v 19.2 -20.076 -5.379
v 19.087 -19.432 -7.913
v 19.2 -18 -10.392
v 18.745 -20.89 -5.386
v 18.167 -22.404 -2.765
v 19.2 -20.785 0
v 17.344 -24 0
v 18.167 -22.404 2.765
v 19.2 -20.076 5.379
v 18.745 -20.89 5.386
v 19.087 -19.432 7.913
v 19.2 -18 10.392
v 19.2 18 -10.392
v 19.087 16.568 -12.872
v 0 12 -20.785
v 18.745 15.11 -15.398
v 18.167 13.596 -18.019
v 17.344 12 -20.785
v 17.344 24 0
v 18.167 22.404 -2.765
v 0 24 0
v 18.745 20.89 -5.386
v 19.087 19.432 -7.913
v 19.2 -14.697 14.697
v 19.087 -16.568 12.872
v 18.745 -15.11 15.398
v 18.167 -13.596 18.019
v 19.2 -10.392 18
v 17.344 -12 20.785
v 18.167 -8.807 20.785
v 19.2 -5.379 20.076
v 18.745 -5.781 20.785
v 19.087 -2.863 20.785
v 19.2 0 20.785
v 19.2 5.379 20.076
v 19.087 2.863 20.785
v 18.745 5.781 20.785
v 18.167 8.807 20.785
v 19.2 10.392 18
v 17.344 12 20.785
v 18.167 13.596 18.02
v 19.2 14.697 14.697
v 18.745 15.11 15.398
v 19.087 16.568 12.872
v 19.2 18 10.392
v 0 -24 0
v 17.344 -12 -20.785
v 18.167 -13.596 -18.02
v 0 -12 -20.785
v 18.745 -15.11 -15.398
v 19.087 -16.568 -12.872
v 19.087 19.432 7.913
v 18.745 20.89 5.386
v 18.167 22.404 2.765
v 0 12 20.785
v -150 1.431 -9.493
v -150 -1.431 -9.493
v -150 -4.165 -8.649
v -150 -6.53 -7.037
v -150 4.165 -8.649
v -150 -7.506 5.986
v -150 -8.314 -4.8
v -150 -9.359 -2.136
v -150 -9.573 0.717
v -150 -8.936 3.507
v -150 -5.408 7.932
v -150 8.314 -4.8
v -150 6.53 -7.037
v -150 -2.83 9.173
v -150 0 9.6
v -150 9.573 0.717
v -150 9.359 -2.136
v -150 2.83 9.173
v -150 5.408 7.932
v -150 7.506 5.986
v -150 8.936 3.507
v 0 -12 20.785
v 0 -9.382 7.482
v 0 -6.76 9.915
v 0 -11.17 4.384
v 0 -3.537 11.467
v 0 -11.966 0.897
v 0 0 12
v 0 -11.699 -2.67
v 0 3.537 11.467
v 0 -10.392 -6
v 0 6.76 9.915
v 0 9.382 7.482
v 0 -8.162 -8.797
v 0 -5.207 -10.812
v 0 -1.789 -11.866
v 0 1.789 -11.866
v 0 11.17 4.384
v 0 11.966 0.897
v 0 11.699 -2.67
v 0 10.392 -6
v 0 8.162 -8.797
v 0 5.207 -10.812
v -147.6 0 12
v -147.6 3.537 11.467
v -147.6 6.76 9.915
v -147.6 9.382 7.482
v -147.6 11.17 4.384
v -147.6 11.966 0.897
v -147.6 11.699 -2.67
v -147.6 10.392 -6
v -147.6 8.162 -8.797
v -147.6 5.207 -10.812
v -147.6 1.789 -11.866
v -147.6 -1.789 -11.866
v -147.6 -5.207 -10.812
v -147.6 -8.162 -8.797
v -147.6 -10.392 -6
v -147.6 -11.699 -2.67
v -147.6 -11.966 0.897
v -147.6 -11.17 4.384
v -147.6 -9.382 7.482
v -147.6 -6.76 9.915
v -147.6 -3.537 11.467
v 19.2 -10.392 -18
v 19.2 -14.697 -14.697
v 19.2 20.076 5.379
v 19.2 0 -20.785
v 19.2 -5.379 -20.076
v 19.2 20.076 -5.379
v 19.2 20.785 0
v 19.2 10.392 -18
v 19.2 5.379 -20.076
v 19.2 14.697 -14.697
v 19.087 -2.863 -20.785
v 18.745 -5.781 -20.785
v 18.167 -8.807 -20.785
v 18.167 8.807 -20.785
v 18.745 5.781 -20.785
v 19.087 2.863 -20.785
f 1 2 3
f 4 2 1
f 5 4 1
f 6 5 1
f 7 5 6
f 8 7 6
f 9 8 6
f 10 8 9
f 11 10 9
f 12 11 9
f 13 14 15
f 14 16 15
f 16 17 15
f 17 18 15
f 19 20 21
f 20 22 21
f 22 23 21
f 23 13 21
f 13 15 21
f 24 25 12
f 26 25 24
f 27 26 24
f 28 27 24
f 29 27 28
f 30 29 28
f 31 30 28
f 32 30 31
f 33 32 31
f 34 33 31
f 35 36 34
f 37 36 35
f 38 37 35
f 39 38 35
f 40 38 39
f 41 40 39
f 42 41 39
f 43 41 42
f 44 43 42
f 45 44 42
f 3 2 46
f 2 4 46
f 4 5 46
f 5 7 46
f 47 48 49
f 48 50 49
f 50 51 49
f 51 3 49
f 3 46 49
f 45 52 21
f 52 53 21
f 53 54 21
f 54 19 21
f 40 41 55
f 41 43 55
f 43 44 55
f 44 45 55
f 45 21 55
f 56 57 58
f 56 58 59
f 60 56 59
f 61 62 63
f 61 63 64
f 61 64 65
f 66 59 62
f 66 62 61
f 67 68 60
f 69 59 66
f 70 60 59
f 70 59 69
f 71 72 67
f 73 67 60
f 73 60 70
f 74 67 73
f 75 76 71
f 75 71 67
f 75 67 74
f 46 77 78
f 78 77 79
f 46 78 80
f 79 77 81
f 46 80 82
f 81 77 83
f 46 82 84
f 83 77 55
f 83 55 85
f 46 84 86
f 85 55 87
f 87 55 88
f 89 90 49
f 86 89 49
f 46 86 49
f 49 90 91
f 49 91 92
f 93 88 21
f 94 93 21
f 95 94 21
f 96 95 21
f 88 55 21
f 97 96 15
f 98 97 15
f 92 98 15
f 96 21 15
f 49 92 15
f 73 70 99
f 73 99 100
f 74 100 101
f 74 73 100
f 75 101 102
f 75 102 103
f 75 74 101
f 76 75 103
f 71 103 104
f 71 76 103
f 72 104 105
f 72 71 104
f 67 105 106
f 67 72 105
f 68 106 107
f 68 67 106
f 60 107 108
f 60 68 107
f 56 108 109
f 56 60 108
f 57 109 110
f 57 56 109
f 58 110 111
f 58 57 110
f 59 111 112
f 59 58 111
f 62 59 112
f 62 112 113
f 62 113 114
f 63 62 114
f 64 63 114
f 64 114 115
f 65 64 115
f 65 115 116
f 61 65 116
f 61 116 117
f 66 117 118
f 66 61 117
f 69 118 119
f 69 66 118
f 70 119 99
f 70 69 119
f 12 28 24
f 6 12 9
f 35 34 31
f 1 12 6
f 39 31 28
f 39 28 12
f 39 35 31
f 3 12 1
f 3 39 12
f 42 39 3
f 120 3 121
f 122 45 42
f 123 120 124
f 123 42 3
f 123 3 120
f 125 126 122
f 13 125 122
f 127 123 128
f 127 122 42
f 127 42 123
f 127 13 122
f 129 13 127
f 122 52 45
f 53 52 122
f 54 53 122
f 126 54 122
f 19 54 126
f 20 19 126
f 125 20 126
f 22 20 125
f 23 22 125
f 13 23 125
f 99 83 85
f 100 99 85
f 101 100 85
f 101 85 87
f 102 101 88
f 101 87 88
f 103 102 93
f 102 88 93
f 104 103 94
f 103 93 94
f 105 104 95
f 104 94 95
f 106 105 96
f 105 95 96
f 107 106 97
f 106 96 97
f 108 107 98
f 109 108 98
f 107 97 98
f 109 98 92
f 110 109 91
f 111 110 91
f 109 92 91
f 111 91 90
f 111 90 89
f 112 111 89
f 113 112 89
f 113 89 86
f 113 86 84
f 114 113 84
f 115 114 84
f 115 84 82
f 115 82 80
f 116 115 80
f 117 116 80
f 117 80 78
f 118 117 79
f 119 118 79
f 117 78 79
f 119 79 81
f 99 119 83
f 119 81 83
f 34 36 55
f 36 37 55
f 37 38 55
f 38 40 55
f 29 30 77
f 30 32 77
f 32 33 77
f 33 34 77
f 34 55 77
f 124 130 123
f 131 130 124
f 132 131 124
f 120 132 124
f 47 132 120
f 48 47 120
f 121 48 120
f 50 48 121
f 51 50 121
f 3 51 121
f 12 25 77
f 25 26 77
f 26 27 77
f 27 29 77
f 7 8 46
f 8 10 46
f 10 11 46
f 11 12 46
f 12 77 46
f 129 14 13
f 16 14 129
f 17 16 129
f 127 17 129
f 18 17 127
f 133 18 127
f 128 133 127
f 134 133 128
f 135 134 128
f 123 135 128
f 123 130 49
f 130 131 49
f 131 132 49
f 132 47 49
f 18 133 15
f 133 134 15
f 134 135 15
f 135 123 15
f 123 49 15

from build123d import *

# Parameters (mm, degrees)
BOSS_EXTRUDE2_DEPTH = 19.2
SKETCH3_R           = 12
BOSS_EXTRUDE3_DEPTH = 150
CHAMFER1_SIZE       = 2.4
SKETCH5_OUTSIDE_W   = 599.33
SKETCH5_OUTSIDE_H   = 605.76
SKETCH5_OUTSIDE_R   = 20.784609691
CUT_EXTRUDE1_DEPTH  = 150
CUT_EXTRUDE1_TAPER  = 60


with BuildPart() as part:
    # Sketch1 → Boss-Extrude2 (new body)
    with BuildSketch(Plane(origin=(0, 0, 0), x_dir=(0, 0, -1), z_dir=(1, 0, 0))):
        Polygon((0, 24), (-20.784609691, 12), (-20.784609691, -12), (0, -24), (20.784609691, -12), (20.784609691, 12), align=None)
    extrude(amount=BOSS_EXTRUDE2_DEPTH)

    # Sketch3 → Boss-Extrude3 (add)
    with BuildSketch(Plane.ZY):
        Circle(SKETCH3_R)
    extrude(amount=BOSS_EXTRUDE3_DEPTH)

    # Chamfer1
    chamfer1_edges = [part.edges().sort_by_distance(p)[0] for p in [
        (-150, 0, -12),
    ]]
    chamfer(chamfer1_edges, length=CHAMFER1_SIZE)

    # Sketch5 outside → Cut-Extrude1 (cut)
    with BuildSketch(Plane(origin=(19.2, 0, 0), x_dir=(0, 0, -1), z_dir=(1, 0, 0))):
        Rectangle(SKETCH5_OUTSIDE_W, SKETCH5_OUTSIDE_H)
        Circle(SKETCH5_OUTSIDE_R, mode=Mode.SUBTRACT)
    extrude(amount=-CUT_EXTRUDE1_DEPTH, taper=CUT_EXTRUDE1_TAPER, mode=Mode.SUBTRACT)


solid = part.part
